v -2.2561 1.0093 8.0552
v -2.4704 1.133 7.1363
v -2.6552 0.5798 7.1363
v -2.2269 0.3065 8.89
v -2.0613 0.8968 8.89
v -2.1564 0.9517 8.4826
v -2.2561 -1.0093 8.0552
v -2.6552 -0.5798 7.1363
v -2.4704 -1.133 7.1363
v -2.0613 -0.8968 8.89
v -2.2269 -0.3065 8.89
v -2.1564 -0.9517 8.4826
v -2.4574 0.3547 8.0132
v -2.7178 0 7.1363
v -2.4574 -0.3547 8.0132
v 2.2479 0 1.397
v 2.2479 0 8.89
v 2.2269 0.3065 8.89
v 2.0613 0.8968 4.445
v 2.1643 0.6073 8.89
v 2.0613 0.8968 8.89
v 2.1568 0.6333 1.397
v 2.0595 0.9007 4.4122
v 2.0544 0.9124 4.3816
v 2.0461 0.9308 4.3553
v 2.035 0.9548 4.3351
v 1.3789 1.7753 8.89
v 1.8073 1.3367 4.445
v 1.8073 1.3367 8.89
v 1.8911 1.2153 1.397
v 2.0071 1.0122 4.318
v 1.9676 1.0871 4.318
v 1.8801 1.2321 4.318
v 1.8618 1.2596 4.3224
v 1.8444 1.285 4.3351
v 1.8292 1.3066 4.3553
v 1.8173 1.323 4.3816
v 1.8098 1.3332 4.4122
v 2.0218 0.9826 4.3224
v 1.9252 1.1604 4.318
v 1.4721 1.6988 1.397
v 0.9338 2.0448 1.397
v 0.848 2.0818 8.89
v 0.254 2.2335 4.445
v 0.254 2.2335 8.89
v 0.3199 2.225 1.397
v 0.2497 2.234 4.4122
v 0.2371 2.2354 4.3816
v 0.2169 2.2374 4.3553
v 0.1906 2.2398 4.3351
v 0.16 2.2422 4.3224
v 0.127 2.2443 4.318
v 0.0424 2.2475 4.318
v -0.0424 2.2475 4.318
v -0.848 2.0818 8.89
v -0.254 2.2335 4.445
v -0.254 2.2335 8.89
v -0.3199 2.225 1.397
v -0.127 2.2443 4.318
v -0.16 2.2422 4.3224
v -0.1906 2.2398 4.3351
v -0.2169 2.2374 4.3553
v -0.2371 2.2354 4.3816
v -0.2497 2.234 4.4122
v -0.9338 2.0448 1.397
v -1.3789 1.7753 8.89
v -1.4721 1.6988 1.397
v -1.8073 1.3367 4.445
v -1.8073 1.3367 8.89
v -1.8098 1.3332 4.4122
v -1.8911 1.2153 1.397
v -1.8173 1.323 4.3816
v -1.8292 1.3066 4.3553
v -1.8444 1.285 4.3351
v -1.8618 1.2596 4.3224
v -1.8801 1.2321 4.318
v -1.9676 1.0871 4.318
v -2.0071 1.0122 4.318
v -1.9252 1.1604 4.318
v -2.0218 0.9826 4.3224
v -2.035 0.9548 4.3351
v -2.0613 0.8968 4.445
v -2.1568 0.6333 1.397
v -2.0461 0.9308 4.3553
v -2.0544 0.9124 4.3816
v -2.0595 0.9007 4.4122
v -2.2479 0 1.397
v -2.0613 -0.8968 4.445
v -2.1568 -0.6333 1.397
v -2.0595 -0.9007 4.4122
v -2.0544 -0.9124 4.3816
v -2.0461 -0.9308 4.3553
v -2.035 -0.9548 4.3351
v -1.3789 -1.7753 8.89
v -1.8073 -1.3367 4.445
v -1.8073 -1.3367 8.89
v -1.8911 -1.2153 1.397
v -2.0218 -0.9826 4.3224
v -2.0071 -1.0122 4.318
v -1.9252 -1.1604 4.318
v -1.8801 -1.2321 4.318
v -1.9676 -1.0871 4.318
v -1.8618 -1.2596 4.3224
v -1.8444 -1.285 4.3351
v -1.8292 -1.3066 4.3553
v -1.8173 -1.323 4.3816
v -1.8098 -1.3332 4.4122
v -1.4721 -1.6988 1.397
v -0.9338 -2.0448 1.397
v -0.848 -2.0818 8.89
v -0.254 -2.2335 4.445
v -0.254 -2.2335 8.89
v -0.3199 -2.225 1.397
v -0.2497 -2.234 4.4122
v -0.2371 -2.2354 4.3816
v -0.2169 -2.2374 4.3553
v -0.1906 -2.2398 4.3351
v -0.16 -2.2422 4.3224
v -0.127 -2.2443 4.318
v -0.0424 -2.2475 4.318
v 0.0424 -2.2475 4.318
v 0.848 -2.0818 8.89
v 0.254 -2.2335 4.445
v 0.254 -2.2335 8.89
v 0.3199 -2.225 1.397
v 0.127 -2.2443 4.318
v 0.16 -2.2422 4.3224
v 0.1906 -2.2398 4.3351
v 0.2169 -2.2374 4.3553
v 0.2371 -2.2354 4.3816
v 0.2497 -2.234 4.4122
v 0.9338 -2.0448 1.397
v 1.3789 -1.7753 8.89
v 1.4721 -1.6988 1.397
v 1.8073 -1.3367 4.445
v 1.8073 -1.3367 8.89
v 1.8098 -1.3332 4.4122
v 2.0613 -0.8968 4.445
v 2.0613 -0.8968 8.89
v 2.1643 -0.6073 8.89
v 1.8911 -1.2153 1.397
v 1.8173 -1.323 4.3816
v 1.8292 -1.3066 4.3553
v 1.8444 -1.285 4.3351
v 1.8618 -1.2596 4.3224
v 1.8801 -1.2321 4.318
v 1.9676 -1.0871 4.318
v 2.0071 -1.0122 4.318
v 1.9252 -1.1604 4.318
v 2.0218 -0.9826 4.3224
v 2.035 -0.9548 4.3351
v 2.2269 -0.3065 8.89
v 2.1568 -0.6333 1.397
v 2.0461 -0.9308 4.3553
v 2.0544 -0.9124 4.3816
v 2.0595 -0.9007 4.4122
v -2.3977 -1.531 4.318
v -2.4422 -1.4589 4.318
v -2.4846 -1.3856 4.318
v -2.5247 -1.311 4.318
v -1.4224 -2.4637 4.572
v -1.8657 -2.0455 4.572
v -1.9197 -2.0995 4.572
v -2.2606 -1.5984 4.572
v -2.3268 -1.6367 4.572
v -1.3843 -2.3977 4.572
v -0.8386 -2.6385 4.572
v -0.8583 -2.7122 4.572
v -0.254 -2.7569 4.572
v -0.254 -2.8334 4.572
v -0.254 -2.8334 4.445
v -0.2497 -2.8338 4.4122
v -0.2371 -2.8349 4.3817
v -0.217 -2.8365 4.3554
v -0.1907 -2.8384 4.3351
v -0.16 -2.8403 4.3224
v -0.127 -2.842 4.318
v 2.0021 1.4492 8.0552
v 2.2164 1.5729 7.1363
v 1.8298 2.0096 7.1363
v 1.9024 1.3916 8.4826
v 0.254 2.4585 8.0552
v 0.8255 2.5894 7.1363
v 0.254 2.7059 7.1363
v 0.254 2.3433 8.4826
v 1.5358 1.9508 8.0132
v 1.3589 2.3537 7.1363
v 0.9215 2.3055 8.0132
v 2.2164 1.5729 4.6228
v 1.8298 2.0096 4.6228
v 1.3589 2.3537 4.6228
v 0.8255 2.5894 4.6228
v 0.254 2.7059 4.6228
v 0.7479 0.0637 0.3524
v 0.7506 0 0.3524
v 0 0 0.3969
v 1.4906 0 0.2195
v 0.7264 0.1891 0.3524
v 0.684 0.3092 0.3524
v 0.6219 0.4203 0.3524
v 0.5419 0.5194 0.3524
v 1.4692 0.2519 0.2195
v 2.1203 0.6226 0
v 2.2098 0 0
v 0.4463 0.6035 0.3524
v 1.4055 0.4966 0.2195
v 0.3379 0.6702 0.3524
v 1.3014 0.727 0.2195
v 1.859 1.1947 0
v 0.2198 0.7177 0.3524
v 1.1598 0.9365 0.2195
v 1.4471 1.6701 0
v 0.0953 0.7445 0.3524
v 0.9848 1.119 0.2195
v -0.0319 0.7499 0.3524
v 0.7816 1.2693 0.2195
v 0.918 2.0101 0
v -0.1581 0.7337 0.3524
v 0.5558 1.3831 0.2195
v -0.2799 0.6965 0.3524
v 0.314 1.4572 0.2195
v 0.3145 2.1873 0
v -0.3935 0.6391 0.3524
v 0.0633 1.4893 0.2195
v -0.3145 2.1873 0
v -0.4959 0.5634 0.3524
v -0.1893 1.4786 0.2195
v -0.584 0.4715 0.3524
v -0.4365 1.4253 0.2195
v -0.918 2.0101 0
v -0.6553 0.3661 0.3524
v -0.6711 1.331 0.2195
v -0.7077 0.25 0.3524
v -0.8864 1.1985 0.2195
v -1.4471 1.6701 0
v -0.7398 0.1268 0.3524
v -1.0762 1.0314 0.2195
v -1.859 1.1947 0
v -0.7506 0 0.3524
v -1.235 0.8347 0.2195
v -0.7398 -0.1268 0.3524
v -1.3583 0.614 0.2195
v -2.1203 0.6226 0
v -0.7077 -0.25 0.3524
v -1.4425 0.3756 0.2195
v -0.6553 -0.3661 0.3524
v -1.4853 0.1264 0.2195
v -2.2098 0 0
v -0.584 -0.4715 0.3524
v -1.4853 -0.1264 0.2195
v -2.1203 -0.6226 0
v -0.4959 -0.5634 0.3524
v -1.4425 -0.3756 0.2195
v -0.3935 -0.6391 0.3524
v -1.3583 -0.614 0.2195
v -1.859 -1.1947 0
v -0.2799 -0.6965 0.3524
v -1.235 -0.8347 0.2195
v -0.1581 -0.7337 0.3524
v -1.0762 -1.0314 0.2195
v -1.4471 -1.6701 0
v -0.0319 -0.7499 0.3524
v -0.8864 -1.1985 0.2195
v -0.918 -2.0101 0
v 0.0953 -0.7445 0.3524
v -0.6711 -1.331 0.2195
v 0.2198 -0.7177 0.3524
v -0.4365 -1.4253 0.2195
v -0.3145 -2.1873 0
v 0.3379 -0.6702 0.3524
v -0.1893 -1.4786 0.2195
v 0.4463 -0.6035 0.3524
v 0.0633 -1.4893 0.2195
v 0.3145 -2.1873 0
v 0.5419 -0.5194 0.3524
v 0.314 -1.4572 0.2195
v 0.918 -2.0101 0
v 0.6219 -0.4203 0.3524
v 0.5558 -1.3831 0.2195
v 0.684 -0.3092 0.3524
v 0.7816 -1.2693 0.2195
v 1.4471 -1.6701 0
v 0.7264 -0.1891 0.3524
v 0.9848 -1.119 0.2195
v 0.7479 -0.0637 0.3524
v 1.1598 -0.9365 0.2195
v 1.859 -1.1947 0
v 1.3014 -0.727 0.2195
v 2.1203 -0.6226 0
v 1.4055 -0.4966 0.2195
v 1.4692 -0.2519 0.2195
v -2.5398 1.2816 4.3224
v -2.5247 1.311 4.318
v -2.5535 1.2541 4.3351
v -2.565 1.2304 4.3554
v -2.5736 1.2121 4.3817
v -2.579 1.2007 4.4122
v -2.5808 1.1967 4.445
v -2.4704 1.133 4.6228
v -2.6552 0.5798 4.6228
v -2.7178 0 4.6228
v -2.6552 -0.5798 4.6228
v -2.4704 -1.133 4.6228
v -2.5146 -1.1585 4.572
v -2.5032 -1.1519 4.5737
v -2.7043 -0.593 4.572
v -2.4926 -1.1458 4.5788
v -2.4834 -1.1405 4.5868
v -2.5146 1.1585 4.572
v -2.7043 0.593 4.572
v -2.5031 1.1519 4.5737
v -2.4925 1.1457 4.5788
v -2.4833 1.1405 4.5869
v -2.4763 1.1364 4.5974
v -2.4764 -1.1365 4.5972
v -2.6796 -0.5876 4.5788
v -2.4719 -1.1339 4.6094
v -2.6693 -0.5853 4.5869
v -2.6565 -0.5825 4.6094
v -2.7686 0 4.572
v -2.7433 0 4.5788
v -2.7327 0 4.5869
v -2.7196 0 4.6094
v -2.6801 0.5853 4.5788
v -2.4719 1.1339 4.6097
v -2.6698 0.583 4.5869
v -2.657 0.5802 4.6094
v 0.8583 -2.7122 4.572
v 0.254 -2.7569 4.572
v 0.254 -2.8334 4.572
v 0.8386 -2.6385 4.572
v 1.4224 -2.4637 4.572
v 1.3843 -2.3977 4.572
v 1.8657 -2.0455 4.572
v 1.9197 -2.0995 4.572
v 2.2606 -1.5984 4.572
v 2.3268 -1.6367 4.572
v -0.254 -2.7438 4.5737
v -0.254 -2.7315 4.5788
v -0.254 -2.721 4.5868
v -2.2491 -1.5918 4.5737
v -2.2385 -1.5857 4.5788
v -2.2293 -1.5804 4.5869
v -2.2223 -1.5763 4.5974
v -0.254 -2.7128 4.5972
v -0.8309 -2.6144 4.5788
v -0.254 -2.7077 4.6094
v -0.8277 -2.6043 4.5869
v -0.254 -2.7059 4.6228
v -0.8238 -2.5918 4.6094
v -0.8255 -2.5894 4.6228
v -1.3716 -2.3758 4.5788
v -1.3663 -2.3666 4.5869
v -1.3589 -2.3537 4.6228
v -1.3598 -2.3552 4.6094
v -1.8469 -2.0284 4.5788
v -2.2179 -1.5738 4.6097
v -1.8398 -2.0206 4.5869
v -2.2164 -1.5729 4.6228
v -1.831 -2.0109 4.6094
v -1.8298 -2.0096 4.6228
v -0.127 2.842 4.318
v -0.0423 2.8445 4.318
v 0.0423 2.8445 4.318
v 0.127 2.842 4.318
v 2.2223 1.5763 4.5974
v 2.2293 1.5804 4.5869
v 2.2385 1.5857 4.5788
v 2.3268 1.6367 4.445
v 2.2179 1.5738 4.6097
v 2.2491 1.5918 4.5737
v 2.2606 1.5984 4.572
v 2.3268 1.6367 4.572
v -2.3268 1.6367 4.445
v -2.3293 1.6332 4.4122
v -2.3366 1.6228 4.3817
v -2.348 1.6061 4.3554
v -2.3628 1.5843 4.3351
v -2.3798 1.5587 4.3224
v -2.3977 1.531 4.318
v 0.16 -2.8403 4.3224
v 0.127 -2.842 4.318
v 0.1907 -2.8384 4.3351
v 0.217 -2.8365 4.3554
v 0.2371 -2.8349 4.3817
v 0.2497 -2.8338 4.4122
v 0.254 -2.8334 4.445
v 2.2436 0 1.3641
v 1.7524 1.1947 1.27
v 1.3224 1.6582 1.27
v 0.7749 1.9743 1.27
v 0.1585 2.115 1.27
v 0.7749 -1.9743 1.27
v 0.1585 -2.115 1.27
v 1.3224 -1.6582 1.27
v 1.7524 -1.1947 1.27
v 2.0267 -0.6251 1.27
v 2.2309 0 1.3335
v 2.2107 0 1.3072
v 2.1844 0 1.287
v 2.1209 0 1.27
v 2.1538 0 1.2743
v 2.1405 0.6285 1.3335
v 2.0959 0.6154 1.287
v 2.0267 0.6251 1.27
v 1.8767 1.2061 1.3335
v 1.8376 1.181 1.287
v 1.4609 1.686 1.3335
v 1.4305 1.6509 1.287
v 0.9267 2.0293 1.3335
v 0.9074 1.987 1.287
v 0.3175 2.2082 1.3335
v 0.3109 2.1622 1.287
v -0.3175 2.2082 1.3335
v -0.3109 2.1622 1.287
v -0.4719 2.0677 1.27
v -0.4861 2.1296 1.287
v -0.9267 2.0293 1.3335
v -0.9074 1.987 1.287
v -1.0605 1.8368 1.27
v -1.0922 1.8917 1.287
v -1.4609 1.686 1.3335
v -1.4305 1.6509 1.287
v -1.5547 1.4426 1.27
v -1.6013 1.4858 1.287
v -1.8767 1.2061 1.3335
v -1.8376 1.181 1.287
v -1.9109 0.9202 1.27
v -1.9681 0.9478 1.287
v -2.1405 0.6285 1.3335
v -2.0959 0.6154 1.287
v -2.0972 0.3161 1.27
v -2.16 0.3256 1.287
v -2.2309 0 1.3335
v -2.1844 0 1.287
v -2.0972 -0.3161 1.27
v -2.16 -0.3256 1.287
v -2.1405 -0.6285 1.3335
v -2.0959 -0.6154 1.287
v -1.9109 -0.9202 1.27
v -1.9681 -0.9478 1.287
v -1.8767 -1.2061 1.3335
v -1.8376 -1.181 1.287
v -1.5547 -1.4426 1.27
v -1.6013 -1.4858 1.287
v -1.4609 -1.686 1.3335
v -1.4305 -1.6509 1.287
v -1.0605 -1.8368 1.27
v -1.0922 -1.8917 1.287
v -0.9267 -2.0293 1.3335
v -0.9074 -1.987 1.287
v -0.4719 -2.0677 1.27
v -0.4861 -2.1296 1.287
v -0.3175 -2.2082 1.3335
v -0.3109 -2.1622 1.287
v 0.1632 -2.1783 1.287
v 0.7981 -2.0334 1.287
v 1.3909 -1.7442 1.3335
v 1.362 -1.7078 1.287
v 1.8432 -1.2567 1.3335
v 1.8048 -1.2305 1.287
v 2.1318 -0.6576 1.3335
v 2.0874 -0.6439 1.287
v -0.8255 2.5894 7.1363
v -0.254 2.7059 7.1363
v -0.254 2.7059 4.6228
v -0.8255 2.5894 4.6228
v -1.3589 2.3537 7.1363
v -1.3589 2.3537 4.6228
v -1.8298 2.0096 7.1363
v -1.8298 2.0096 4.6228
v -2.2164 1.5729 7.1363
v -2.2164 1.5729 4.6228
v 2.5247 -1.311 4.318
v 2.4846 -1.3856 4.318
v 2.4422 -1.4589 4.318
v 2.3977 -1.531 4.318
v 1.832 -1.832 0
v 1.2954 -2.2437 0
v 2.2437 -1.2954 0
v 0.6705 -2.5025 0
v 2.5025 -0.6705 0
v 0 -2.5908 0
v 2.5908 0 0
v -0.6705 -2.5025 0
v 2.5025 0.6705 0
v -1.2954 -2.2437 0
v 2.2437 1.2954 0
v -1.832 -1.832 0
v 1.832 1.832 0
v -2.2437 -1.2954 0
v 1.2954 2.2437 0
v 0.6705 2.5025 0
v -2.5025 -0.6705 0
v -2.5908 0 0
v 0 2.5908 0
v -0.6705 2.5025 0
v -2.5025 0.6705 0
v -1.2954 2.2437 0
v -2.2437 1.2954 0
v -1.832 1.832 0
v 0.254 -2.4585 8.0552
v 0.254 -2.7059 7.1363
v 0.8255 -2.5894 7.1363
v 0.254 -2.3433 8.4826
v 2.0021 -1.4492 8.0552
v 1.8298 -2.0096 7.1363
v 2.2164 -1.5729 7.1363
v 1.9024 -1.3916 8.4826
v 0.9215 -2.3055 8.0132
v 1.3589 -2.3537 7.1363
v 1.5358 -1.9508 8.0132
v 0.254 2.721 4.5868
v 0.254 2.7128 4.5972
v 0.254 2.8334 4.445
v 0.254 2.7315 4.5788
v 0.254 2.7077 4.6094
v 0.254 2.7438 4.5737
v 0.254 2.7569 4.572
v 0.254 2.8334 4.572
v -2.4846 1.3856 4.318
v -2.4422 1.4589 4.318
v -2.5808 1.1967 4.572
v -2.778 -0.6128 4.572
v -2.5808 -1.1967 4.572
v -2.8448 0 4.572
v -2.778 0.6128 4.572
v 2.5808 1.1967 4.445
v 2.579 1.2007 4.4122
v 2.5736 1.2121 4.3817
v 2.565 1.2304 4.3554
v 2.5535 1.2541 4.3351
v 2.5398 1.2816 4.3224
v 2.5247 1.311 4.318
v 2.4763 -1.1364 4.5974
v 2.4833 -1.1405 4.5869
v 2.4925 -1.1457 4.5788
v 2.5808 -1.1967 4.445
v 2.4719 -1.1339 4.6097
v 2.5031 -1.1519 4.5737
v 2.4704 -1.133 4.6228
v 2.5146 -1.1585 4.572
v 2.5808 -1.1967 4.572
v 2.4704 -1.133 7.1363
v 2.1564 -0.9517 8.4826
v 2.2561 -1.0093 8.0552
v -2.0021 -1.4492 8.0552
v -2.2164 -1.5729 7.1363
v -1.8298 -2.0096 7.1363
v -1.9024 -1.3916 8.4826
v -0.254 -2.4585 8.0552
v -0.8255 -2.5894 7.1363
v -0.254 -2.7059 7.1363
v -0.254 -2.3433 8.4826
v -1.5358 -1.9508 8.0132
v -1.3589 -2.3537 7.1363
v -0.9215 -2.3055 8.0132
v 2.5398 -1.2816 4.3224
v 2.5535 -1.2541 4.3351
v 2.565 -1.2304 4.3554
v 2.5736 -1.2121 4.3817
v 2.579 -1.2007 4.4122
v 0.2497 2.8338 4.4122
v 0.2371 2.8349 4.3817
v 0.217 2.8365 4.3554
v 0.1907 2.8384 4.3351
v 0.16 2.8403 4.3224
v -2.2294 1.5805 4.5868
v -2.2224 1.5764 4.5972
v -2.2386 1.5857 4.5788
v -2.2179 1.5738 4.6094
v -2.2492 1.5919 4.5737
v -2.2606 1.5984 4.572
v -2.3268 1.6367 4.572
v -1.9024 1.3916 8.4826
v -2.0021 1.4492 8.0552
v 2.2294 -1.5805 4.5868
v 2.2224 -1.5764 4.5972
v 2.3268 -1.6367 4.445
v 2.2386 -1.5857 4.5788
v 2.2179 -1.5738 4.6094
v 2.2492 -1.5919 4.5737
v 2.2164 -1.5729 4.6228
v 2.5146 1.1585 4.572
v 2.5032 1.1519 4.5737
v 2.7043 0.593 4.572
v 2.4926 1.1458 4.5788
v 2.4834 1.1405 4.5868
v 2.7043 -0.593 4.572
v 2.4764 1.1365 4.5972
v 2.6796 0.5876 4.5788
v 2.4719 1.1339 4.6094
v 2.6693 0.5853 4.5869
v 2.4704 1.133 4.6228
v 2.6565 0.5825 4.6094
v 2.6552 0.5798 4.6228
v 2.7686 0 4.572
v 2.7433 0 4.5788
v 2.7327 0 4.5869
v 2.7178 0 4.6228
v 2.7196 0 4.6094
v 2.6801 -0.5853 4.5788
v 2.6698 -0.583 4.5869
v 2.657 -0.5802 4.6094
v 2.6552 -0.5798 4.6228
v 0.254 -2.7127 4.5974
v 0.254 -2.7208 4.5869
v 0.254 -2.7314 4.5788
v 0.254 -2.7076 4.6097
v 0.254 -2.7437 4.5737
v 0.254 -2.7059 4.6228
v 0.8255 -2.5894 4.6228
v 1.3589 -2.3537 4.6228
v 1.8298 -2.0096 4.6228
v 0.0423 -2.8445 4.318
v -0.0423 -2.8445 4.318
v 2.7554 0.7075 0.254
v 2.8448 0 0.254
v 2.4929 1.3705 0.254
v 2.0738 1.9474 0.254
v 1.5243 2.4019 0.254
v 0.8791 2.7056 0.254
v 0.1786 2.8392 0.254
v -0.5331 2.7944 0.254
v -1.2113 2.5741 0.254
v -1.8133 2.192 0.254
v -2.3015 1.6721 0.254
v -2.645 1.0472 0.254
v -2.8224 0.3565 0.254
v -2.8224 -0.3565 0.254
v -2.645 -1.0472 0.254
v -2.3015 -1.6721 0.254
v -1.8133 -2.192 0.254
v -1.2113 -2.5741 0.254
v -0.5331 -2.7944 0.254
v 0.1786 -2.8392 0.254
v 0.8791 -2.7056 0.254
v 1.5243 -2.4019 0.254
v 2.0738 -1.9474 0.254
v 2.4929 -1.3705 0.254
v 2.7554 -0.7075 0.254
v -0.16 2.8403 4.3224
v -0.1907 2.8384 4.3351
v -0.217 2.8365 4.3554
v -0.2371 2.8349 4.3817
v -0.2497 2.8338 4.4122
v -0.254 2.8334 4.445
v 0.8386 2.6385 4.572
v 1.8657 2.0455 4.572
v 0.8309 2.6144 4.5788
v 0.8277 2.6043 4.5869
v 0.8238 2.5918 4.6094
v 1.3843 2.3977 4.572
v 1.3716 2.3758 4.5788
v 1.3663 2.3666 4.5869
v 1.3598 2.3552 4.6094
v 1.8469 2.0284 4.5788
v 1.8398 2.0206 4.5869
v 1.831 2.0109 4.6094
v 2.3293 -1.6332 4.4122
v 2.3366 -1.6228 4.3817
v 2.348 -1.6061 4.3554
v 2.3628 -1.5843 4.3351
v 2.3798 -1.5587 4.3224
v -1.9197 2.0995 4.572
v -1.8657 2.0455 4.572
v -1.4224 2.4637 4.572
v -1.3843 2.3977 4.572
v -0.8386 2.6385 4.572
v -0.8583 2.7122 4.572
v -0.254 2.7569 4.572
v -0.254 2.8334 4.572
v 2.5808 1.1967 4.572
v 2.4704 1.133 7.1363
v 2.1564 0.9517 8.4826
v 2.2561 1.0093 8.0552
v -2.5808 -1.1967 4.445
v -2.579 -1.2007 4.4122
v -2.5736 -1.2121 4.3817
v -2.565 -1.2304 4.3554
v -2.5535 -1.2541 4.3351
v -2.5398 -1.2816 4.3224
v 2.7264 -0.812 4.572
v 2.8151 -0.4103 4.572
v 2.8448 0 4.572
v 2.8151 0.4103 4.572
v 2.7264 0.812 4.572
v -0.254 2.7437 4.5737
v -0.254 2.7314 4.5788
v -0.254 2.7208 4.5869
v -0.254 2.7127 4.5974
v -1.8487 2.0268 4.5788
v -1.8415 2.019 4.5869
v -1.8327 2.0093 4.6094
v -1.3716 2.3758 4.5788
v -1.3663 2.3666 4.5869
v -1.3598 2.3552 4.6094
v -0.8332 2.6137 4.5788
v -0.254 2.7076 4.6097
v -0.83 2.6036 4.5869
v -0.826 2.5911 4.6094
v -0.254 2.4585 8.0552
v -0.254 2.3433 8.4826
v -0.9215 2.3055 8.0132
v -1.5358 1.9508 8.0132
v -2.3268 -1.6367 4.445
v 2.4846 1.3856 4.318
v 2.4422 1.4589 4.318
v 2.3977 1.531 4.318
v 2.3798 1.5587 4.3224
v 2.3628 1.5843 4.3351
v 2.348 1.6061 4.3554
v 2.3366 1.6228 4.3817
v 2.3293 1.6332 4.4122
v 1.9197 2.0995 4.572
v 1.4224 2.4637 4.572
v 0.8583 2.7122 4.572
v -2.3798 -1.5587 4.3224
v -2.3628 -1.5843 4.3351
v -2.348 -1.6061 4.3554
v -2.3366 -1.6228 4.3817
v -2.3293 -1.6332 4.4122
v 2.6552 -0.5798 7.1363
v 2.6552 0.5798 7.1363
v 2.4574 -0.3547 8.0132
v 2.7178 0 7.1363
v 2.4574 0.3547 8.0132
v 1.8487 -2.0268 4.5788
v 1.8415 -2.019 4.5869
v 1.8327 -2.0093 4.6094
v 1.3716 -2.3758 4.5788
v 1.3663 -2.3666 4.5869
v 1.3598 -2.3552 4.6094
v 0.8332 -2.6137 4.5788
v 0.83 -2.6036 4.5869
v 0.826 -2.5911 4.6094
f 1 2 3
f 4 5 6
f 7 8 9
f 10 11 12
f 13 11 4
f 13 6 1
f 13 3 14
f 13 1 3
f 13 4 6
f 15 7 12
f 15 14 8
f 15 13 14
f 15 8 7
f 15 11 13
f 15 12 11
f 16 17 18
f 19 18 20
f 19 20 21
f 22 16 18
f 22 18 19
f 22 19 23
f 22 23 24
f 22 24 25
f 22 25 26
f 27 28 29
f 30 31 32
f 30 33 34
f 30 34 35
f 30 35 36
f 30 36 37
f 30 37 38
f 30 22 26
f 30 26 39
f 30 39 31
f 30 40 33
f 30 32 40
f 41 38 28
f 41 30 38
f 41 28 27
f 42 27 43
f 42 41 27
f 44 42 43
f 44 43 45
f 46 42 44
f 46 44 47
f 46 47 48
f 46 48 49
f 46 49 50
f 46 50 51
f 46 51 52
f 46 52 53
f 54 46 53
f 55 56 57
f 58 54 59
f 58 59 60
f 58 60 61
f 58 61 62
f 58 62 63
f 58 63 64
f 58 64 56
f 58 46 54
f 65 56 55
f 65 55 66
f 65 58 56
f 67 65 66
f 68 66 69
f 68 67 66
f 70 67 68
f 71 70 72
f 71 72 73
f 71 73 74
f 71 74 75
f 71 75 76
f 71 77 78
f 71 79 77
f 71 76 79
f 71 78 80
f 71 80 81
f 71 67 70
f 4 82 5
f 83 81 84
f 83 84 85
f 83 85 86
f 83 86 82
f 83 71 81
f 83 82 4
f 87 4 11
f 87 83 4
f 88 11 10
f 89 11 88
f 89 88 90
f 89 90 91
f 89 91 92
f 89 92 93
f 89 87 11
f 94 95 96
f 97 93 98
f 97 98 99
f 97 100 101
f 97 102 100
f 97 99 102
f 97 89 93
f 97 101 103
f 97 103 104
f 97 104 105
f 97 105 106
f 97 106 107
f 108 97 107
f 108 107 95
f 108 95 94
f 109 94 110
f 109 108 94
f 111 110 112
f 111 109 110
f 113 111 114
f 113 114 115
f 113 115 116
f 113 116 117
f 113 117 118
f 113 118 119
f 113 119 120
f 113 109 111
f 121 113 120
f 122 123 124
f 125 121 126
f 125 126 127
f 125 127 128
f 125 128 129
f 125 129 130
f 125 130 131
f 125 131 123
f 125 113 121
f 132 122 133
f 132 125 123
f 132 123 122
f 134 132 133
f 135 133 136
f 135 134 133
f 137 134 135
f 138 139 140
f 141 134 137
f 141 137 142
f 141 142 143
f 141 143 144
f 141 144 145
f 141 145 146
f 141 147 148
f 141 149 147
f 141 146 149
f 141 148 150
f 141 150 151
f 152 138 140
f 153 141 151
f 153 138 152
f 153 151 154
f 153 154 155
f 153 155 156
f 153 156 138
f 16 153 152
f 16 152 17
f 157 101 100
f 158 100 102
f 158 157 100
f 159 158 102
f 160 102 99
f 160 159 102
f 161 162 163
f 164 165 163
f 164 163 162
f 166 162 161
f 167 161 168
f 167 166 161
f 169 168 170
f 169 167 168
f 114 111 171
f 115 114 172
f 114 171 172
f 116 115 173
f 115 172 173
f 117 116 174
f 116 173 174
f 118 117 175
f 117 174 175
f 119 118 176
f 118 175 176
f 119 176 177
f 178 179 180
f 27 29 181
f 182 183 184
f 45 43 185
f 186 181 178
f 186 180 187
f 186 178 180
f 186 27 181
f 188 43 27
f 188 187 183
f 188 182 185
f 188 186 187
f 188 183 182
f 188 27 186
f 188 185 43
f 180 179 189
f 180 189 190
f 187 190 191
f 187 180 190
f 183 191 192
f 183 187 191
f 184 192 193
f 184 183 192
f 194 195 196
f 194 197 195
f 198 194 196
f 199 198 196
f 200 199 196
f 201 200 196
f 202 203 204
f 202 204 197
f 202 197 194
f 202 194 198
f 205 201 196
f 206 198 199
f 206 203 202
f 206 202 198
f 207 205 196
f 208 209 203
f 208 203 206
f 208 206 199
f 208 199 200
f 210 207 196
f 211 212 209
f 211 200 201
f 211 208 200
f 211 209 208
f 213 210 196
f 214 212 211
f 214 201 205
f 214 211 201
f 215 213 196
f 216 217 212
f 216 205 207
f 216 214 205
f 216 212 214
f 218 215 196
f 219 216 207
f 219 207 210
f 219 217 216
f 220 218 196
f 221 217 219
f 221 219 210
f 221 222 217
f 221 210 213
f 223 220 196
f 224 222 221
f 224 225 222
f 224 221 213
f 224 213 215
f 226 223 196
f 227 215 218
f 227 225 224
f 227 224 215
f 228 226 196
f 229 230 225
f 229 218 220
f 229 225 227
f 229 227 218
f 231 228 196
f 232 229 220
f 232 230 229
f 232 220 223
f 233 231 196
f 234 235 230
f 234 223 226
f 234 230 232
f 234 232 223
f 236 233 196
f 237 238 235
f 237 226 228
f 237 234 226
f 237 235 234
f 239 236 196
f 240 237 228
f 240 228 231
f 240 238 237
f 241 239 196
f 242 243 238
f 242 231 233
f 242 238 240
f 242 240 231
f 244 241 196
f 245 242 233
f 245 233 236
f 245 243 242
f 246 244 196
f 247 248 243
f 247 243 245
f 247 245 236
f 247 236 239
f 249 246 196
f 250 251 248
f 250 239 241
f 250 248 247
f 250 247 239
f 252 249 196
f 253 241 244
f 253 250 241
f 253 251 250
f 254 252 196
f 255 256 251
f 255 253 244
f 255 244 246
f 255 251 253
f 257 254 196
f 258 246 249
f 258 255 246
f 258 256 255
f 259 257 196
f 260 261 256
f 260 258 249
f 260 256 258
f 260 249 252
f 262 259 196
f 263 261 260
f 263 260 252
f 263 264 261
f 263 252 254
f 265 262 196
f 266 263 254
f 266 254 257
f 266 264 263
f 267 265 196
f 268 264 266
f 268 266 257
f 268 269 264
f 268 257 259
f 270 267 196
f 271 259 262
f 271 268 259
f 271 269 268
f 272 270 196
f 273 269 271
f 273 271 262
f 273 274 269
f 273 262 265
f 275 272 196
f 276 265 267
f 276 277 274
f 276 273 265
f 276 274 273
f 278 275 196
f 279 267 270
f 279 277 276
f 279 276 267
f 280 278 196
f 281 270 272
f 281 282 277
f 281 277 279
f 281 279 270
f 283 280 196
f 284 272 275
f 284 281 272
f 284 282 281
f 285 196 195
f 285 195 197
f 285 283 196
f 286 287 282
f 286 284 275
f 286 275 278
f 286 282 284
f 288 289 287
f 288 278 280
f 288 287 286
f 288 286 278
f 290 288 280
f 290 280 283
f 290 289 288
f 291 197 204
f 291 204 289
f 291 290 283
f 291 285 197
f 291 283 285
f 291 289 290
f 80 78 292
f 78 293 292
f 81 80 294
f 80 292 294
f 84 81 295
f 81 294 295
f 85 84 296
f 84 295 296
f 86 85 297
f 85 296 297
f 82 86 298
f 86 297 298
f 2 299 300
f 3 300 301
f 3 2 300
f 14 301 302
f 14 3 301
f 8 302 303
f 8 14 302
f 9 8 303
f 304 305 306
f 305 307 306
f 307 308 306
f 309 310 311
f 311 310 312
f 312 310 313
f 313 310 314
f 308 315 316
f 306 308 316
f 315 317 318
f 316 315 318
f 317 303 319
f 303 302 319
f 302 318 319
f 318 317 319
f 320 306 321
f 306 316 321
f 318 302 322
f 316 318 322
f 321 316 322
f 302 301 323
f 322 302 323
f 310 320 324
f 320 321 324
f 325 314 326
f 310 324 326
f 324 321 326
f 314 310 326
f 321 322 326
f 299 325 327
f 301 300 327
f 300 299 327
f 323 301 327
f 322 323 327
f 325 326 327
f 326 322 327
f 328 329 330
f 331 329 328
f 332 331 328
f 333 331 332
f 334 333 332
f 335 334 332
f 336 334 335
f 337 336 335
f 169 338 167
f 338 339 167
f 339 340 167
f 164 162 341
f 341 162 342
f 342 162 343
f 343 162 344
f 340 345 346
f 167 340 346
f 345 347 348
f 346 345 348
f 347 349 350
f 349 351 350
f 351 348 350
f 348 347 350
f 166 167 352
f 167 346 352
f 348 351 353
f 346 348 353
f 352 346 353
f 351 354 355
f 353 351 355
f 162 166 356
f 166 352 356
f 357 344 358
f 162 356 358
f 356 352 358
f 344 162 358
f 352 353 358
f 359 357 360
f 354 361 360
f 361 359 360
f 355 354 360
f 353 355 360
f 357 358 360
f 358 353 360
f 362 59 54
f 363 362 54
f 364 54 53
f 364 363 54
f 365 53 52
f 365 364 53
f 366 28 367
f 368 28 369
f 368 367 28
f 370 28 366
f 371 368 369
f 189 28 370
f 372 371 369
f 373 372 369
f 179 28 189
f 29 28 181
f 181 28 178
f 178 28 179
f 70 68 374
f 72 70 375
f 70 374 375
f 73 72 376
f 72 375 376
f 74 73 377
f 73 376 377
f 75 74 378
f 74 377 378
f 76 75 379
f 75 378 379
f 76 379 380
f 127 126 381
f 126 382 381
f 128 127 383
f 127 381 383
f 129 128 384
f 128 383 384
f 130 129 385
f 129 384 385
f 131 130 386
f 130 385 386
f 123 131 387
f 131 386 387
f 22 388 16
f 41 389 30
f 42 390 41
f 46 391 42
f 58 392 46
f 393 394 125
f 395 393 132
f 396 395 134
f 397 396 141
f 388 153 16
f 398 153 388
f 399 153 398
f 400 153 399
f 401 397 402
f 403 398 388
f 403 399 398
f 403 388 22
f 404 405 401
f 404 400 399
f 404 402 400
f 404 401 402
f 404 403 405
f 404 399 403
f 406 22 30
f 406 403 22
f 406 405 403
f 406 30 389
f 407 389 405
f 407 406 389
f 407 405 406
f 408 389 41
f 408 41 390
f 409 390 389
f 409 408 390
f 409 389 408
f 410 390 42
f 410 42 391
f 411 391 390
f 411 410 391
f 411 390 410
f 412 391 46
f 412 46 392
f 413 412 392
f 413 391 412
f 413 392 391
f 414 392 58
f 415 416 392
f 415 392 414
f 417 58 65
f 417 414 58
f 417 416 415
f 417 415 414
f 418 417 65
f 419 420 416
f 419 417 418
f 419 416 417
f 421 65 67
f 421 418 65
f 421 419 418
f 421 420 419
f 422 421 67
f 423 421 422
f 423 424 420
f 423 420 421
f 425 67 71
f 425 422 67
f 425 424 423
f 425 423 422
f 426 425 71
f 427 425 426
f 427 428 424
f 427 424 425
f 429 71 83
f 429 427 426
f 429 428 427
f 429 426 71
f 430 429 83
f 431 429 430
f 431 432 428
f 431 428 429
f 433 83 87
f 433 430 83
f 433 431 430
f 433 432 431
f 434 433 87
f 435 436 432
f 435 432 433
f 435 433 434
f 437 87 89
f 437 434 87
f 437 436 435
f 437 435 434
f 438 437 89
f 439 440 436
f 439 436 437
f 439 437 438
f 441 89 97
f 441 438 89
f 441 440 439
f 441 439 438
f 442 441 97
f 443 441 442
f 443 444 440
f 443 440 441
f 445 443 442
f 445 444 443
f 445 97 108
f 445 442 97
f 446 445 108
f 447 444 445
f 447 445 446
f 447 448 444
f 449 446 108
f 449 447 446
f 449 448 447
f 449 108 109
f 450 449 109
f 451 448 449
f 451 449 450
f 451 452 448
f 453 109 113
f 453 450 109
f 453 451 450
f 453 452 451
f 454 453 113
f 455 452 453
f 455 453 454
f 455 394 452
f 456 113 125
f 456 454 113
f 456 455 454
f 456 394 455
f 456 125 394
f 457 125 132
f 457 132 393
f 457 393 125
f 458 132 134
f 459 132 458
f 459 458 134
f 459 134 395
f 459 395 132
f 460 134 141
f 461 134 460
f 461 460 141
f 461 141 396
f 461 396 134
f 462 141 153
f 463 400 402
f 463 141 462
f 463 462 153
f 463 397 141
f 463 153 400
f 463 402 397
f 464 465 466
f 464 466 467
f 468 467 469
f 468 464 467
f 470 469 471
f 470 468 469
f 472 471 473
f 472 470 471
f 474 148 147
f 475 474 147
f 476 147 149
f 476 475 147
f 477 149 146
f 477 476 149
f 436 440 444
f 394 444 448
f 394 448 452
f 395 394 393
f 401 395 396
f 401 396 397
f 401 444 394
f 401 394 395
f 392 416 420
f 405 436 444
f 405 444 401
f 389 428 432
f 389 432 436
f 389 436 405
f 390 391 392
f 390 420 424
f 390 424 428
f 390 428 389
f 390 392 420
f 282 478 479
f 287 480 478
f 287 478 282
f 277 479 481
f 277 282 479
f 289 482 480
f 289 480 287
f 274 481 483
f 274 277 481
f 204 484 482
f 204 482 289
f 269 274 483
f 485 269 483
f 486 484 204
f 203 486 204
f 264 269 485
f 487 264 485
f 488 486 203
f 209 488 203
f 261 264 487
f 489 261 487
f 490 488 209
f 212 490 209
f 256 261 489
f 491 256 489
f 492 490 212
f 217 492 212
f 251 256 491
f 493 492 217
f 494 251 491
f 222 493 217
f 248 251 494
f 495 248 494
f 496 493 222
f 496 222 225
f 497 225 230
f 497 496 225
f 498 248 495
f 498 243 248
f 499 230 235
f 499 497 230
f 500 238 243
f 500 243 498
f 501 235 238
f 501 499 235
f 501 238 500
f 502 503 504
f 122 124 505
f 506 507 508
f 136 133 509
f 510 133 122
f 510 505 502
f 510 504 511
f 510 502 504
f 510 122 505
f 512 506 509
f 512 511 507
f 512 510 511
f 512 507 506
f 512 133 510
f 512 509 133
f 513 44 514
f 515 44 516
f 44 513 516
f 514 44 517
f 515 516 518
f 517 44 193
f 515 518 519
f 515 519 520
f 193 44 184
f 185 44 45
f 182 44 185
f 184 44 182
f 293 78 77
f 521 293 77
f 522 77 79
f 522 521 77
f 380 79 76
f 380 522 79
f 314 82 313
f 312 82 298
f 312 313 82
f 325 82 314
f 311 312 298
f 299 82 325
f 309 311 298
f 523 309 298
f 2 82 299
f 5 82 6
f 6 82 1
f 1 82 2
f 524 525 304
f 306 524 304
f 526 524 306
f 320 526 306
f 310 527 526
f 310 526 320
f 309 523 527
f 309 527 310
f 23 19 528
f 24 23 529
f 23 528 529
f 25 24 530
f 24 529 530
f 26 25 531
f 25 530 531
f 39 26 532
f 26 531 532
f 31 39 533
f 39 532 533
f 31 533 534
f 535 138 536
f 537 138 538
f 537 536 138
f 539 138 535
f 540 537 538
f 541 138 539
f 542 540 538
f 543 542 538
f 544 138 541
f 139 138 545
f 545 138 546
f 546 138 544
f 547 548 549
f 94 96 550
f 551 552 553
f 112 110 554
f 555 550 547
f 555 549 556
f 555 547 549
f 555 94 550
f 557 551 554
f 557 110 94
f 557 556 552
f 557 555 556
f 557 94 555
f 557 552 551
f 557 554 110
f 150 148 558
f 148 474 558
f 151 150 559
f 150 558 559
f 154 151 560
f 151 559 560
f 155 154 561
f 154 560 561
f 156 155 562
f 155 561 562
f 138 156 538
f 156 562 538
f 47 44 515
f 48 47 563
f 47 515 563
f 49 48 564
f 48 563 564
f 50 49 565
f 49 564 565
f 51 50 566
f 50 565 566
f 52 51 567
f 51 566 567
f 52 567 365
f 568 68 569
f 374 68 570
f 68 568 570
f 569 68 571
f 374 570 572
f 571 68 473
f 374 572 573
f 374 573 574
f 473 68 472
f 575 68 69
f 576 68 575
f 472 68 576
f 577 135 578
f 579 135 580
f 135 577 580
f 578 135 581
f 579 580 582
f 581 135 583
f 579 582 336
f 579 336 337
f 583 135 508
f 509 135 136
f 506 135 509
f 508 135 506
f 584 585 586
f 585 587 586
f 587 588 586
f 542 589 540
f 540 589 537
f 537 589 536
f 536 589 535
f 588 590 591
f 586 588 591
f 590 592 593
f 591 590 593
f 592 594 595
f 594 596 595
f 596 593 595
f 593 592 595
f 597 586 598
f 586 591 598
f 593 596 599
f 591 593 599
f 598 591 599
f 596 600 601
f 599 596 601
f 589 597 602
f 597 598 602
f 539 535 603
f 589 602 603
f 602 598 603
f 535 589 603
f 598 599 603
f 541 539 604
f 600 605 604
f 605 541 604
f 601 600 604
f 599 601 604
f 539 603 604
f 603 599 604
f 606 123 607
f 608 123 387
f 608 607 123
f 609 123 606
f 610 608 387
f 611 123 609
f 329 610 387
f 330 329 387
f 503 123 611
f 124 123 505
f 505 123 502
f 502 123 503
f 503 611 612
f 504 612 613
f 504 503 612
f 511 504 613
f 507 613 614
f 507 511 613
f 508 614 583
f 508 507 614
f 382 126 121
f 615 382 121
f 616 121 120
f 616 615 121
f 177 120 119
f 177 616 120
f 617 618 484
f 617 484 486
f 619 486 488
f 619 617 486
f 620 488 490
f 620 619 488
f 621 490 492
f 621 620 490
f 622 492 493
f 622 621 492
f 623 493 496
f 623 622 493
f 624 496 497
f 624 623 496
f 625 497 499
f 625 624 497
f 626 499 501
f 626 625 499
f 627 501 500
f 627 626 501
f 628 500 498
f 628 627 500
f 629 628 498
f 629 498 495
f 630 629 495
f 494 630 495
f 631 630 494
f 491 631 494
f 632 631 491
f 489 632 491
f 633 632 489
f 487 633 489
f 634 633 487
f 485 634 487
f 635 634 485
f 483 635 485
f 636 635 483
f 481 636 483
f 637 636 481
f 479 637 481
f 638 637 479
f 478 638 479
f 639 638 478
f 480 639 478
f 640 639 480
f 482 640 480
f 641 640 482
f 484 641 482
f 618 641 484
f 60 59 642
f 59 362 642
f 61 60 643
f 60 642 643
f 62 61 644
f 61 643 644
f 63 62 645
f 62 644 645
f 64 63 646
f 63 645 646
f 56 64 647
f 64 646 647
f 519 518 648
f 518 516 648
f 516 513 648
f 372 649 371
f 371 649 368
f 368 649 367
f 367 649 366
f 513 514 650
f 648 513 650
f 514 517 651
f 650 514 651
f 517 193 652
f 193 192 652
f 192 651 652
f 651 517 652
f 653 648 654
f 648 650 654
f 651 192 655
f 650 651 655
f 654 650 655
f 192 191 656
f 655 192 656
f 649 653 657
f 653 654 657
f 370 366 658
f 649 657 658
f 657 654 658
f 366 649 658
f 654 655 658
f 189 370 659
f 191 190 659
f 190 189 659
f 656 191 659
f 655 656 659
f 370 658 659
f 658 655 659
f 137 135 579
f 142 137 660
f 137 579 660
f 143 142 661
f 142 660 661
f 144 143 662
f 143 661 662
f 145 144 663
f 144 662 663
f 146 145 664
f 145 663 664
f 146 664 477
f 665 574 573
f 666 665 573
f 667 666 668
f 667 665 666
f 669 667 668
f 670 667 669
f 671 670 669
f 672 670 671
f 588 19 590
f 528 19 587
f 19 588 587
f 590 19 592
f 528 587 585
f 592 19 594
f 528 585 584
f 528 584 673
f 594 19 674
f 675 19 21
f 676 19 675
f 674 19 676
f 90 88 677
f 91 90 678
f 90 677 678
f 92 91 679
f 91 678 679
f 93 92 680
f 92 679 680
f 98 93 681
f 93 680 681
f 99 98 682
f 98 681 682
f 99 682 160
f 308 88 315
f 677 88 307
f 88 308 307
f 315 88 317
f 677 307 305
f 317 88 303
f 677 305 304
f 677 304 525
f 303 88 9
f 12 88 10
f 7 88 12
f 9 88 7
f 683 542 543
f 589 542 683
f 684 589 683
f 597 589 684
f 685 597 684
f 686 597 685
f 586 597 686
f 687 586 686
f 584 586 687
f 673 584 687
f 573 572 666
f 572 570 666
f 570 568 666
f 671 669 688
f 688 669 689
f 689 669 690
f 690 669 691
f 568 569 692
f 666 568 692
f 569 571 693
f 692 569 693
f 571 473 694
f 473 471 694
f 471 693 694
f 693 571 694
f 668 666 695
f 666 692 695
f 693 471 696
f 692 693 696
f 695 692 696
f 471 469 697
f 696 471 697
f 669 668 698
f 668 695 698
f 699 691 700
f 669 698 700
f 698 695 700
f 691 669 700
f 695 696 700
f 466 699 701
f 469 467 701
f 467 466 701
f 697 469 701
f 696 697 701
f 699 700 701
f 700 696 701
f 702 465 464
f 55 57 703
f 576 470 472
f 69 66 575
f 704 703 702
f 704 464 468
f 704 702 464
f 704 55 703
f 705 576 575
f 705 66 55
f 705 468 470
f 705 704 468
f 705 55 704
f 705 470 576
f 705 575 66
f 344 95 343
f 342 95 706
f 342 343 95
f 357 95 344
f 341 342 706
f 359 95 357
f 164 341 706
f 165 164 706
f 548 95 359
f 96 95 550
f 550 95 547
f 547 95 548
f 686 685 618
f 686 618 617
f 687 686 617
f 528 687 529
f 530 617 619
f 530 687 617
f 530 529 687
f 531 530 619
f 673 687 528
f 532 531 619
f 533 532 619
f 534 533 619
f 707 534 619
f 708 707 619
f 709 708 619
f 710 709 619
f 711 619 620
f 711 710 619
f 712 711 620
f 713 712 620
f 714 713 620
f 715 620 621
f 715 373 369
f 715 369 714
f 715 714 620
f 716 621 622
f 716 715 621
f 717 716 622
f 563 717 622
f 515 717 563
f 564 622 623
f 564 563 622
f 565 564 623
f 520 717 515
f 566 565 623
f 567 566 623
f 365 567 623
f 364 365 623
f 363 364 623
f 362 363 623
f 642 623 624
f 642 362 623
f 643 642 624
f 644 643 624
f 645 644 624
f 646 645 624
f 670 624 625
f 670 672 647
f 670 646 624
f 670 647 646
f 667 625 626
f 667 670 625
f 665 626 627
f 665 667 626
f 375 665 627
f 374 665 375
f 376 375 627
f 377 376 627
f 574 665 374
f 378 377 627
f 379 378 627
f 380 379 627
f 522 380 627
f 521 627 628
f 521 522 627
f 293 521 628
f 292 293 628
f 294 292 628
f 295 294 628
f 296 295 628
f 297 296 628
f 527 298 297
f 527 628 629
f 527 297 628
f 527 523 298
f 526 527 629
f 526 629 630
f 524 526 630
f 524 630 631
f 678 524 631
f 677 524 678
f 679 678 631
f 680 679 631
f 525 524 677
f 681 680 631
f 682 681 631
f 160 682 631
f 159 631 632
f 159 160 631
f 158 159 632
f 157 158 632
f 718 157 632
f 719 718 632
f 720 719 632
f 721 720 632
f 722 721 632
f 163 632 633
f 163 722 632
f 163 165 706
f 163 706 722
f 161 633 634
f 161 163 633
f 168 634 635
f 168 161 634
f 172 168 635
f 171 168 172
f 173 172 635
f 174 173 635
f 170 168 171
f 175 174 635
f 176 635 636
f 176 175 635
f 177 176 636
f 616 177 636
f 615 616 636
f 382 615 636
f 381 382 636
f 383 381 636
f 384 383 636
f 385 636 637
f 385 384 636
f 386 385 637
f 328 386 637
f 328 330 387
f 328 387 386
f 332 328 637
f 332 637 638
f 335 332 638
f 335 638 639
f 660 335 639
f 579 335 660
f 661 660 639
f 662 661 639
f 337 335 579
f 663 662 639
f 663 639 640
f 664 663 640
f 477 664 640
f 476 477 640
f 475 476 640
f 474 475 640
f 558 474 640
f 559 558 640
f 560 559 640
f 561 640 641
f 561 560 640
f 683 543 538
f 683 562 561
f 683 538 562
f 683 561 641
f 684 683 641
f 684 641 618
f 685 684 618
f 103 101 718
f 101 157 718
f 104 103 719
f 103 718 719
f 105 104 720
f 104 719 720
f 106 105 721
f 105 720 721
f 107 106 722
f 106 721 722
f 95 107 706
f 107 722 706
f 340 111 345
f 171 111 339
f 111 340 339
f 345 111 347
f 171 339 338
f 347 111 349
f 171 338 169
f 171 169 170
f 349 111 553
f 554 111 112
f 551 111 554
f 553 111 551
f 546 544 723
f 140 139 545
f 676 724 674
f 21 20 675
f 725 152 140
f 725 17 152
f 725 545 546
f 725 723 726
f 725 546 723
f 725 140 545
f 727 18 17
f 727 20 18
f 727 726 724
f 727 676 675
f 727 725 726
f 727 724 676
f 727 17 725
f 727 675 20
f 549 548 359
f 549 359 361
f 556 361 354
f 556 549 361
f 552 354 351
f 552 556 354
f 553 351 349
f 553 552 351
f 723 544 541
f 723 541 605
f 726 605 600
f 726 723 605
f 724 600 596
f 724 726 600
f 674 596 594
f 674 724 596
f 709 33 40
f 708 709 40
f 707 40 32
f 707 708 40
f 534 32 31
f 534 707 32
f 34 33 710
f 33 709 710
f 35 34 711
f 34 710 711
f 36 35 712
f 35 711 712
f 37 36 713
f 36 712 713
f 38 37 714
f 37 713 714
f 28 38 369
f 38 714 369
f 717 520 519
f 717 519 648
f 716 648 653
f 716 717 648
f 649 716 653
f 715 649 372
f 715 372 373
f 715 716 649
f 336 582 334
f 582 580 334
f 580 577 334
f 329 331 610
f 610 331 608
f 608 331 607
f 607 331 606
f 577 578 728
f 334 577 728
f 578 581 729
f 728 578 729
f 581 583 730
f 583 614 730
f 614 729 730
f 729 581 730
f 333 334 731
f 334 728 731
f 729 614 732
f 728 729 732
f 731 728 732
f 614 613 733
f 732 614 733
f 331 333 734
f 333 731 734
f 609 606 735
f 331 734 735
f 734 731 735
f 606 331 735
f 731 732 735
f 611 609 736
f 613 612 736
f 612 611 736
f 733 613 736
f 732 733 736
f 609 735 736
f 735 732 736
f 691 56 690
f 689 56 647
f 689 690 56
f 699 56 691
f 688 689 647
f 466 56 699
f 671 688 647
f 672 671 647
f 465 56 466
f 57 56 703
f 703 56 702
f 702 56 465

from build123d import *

# Parameters (mm, degrees)
F3_SIZE         = 0.254
F4_W            = 0.508
F4_H            = 3.048
F6_DEPTH        = 4.572
F6_COPIES_COUNT = 6
F7_R            = 0.127
F8_R            = 0.0508


# Not quite as in the source:
# - a pattern or mirror of a feature is missing from the dataset's text; its kind, count and spacing are read off the source's solid


with BuildPart() as f1:
    # F0 (on Front) → F1 (revolve)
    with BuildSketch(Plane.XZ):
        with BuildLine():
            Line((2.2098, 0), (2.8448, 0))
            Line((2.8448, 0), (2.8448, 4.572))
            Line((2.8448, 4.572), (2.7178, 4.572))
            Line((2.7178, 4.572), (2.7178, 7.1363093255))
            Line((2.7178, 7.1363093255), (2.2479, 8.89))
            Line((2.2479, 8.89), (2.2479, 1.397))
            ThreePointArc((2.2479, 1.397), (2.2107025612, 1.3071974388), (2.1209, 1.27))
            Line((2.1209, 1.27), (0, 1.27))
            Line((0, 1.27), (0, 0.3969097134))
            ThreePointArc((0, 0.3969097134), (1.1225811063, 0.2968946462), (2.2098, 0))
        make_face()
    revolve(axis=Axis((0, 0, 7.5646454352), (0, 0, 1)))

    # F3
    f3_edges = [f1.edges().sort_by_distance(p)[0] for p in [
        (-2.8448, 0, 0),
    ]]
    chamfer(f3_edges, length=F3_SIZE)

    # F4 (on offset) → F6 (cut)
    with BuildSketch(Plane.XY.offset(8.89)):
        with Locations((0, 1.524)):
            Rectangle(F4_W, F4_H)
    f6 = extrude(amount=-F6_DEPTH, mode=Mode.SUBTRACT)

    # F6_copies: F6 ×6 about axis
    f6_copies_axis = Axis((0, 0, 0), (0, 0, 1))
    for i in range(1, F6_COPIES_COUNT):
        add(f6.rotate(f6_copies_axis, i * 360 / F6_COPIES_COUNT), mode=Mode.SUBTRACT)

    # F7
    f7_edges = [f1.edges().sort_by_distance(p)[0] for p in [
        (-0.254, 2.533471, 4.318),
        (0.254, 2.533471, 4.318),
        (2.32105, 1.046765, 4.318),
        (2.06705, 1.486706, 4.318),
        (-2.06705, 1.486706, 4.318),
        (-2.32105, 1.046765, 4.318),
        (-2.32105, -1.046765, 4.318),
        (-2.06705, -1.486706, 4.318),
        (-0.254, -2.533471, 4.318),
        (0.254, -2.533471, 4.318),
        (2.06705, -1.486706, 4.318),
        (2.32105, -1.046765, 4.318),
    ]]
    fillet(f7_edges, radius=F7_R)

    # F8
    f8_edges = [f1.edges().sort_by_distance(p)[0] for p in [
        (2.7178, 0, 4.572),
        (1.3589, 2.353684, 4.572),
        (-1.3589, 2.353684, 4.572),
        (1.3589, -2.353684, 4.572),
        (-2.7178, 0, 4.572),
        (-1.3589, -2.353684, 4.572),
    ]]
    fillet(f8_edges, radius=F8_R)


solid = f1.part
